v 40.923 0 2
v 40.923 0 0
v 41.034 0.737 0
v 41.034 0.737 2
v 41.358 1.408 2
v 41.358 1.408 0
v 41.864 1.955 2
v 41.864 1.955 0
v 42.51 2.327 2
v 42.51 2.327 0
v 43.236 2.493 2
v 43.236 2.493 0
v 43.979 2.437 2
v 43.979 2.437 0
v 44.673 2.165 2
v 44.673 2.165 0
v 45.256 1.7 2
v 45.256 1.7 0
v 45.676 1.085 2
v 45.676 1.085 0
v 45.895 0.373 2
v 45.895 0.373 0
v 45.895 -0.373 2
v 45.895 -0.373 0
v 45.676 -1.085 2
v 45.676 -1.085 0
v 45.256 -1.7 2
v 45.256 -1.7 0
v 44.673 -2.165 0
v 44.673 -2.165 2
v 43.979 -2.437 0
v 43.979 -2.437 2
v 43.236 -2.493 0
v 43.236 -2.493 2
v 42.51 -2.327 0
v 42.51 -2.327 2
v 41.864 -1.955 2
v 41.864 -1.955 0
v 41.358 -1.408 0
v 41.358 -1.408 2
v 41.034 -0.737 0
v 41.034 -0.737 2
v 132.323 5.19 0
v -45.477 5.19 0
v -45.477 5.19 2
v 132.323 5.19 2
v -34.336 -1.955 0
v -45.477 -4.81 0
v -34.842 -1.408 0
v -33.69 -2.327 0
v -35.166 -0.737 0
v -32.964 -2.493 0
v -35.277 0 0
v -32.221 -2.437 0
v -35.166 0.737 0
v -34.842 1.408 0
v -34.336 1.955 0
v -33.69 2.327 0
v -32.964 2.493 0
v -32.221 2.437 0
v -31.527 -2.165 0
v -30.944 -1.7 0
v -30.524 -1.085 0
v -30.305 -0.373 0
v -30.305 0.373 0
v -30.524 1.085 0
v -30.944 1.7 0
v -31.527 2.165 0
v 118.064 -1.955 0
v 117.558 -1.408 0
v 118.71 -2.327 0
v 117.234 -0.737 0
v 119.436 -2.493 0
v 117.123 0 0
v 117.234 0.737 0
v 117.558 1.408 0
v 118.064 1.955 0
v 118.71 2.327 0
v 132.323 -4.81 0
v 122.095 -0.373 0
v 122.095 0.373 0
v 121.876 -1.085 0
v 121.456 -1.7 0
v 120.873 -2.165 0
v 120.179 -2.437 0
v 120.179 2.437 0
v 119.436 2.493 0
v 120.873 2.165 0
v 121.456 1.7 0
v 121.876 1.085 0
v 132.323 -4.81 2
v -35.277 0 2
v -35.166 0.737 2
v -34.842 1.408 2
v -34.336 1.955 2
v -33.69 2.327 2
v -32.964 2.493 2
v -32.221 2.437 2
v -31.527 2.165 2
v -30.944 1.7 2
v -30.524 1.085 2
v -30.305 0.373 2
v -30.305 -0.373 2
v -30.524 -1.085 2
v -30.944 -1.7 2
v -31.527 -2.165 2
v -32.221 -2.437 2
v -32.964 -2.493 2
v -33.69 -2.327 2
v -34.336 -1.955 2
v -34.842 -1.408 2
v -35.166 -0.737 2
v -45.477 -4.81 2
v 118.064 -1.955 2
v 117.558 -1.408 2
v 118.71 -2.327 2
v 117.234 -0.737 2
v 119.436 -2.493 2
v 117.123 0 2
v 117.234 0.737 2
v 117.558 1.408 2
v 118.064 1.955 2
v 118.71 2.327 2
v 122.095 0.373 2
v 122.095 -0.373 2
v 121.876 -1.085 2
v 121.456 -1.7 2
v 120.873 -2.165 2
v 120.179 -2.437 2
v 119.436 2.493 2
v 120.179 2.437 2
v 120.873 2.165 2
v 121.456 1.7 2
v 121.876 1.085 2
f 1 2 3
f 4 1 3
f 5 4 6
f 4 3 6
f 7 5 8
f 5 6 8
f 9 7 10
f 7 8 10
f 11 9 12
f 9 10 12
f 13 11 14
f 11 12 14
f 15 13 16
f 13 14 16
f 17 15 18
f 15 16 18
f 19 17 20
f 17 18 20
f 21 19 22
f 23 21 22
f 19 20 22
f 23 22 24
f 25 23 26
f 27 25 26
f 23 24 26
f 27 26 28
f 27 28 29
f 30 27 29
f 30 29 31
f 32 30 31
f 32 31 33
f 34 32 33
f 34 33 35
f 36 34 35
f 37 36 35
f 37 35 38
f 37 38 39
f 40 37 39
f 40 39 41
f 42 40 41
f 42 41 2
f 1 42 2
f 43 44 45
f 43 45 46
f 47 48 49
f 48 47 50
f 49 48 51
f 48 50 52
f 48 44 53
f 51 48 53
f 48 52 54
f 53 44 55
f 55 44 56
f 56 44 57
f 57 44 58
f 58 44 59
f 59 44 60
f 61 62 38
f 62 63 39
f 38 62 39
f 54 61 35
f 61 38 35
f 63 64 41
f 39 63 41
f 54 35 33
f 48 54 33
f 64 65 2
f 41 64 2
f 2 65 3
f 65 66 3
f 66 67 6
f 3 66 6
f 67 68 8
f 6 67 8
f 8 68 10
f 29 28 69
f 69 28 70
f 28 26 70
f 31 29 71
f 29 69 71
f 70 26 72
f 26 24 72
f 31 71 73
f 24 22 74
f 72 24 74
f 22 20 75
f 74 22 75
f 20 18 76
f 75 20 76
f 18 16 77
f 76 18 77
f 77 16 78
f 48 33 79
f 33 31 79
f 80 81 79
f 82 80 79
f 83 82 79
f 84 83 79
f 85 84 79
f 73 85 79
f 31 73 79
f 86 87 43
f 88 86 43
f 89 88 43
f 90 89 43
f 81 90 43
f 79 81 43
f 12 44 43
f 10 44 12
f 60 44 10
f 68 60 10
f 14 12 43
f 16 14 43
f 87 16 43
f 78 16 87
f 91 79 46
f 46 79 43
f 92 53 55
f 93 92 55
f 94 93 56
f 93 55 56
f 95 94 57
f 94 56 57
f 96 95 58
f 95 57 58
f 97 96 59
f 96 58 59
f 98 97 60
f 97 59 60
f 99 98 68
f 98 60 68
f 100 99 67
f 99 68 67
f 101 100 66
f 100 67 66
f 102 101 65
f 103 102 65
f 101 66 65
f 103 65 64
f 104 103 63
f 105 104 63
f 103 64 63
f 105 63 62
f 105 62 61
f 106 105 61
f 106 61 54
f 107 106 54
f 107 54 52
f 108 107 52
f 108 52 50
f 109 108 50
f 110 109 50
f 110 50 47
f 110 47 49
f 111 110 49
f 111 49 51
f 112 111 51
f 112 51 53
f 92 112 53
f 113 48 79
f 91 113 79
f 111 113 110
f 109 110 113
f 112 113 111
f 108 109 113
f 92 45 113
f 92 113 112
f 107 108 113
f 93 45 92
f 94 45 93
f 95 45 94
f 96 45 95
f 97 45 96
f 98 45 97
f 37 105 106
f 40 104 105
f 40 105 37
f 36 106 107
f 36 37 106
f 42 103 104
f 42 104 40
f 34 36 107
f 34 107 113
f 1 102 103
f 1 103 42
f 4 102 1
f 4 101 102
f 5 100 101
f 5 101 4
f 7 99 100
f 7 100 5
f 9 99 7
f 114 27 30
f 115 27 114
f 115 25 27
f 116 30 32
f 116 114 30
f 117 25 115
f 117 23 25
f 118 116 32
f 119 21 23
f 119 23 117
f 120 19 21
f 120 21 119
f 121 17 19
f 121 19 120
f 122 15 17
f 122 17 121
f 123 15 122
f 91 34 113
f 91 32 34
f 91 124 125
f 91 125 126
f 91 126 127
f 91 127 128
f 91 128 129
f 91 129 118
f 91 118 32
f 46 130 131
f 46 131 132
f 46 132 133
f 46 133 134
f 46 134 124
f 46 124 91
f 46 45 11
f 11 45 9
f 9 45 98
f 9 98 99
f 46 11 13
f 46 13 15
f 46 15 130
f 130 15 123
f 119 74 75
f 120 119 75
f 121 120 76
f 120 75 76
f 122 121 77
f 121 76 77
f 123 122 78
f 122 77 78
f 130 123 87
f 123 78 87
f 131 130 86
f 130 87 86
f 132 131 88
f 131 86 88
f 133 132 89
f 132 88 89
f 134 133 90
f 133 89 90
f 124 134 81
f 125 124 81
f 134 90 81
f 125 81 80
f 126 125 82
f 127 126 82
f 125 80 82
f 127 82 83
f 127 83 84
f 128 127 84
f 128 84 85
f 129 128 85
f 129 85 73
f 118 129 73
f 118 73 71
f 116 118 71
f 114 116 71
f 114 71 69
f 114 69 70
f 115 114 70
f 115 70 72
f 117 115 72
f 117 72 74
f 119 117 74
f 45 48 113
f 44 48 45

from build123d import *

# Parameters (mm, degrees)
SKETCH1_W                    = 177.8
SKETCH1_H                    = 10
BOSS_EXTRUDE1_DEPTH          = 2
F_5_0_5_DIAMETER_HOLE1_D     = 5
F_5_0_5_DIAMETER_HOLE1_DEPTH = 5
F_5_0_5_DIAMETER_HOLE1_TIP   = 1.502151548


with BuildPart() as part:
    # Sketch1 → Boss-Extrude1 (new body)
    with BuildSketch(Plane.XY):
        with Locations((43.423133199, 0.190336281)):
            Rectangle(SKETCH1_W, SKETCH1_H)
    extrude(amount=BOSS_EXTRUDE1_DEPTH)

    # Ø5.0 (5) Diameter Hole1
    with Locations(Plane.XY.offset(2)):
        with Locations((-32.776866801, 0), (43.423133199, 0), (119.623133199, 0)):
            Hole(F_5_0_5_DIAMETER_HOLE1_D / 2, depth=F_5_0_5_DIAMETER_HOLE1_DEPTH)
            with Locations((0, 0, -(F_5_0_5_DIAMETER_HOLE1_DEPTH + F_5_0_5_DIAMETER_HOLE1_TIP / 2))):  # 118° drill point
                Cone(0, F_5_0_5_DIAMETER_HOLE1_D / 2, F_5_0_5_DIAMETER_HOLE1_TIP, mode=Mode.SUBTRACT)


solid = part.part
